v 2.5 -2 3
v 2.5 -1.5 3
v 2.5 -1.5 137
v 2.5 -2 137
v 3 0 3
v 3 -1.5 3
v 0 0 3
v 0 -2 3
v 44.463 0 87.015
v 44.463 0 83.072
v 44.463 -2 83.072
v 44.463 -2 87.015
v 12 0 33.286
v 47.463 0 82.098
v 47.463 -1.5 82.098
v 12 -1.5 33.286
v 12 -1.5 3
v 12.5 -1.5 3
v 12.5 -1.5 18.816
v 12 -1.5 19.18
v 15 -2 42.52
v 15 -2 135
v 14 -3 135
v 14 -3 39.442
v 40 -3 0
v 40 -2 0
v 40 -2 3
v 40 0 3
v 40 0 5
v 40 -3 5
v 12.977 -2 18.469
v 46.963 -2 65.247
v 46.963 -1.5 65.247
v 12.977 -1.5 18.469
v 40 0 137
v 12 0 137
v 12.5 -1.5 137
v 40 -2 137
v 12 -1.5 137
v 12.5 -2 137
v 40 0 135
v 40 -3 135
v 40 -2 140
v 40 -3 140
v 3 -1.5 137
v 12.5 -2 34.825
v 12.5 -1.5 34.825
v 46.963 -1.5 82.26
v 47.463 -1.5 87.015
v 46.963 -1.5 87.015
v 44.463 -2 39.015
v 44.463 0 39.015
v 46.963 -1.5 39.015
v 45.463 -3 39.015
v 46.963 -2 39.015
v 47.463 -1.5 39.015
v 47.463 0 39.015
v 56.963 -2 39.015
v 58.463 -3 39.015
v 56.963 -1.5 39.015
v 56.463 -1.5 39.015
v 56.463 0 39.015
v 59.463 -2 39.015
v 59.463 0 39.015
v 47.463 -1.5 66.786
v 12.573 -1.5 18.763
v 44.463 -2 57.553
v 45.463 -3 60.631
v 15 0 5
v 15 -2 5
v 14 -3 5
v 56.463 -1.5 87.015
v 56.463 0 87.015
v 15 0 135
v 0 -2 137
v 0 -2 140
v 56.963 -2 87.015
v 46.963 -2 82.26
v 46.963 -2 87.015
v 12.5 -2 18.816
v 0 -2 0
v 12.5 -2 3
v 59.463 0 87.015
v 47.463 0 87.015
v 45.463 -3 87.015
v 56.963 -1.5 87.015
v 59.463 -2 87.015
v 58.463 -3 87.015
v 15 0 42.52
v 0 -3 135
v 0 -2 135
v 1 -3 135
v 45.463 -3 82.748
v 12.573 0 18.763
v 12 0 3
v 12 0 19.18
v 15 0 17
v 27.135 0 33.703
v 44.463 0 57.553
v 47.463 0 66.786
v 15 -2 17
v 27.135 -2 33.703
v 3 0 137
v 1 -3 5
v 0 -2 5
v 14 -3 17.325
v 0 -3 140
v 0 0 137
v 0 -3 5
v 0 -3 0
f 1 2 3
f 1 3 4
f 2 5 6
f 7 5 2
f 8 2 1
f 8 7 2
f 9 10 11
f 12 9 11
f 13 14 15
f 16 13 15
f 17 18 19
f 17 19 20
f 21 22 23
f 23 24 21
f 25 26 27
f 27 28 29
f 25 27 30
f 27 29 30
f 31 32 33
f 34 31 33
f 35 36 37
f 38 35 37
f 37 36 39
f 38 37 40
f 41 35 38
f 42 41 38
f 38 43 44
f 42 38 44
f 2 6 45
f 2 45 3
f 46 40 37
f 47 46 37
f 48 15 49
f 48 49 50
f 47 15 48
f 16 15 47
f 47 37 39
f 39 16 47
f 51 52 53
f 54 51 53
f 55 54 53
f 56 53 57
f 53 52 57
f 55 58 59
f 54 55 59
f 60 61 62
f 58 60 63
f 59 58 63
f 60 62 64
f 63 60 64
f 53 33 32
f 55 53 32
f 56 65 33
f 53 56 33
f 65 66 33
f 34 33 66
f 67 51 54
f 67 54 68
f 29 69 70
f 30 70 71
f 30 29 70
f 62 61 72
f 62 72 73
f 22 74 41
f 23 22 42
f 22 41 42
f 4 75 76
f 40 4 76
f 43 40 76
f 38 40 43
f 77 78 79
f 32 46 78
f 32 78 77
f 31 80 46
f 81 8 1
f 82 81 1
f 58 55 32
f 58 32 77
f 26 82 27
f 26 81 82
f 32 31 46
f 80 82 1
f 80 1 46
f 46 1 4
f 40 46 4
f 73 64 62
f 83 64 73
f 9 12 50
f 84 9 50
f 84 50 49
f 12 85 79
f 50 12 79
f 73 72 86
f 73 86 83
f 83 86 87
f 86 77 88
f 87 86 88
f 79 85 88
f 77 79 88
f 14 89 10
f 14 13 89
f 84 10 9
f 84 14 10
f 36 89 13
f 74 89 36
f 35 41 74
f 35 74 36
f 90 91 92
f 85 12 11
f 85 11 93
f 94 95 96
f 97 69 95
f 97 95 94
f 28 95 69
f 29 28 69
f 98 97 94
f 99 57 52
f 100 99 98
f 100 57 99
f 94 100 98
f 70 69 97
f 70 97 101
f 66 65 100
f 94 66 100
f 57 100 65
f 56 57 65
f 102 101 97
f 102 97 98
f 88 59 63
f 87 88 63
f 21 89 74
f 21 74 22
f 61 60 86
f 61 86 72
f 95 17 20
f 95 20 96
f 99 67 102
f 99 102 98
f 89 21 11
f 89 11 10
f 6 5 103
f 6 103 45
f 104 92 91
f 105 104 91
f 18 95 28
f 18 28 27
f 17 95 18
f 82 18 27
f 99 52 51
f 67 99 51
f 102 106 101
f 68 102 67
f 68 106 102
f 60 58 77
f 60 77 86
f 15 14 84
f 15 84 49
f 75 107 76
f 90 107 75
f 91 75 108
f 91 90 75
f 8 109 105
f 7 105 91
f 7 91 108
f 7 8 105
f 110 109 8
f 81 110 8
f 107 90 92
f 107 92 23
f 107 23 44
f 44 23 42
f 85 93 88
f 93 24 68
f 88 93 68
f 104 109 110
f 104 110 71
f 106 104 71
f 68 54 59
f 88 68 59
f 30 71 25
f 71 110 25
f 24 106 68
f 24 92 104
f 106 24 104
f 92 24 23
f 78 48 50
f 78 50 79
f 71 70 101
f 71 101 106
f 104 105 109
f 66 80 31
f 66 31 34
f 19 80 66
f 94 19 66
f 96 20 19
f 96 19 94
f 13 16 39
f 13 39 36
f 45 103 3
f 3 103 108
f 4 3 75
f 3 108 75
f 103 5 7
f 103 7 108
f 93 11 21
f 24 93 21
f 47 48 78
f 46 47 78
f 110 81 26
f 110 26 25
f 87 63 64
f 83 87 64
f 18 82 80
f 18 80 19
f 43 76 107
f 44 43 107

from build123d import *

# Parameters (mm, degrees)
PAD_DEPTH       = 140
PAD001_DEPTH    = 2
SKETCH002_W     = 15
SKETCH002_H     = 2
PAD002_DEPTH    = 55
PAD003_DEPTH    = 2
PAD004_DEPTH    = 48
SKETCH006_W     = 3
SKETCH006_H     = 5
PAD005_DEPTH    = 40
SKETCH007_W     = 2
SKETCH007_H     = 3
POCKET_DEPTH    = 40
SKETCH008_W     = 3
SKETCH008_H     = 5
PAD006_DEPTH    = 40
SKETCH009_W     = 2
SKETCH009_H     = 3
POCKET001_DEPTH = 40
PAD007_DEPTH    = 73.5
POCKET002_DEPTH = 134
POCKET003_DEPTH = 48
POCKET004_DEPTH = 72


with BuildPart() as part:
    # Sketch001 → Pad (new body)
    with BuildSketch(Plane.XY):
        Polygon((1, -3), (0, -2), (0, 0), (15, 0), (15, -2), (14, -3), align=None)
    extrude(amount=PAD_DEPTH)

    # Sketch (on Face3 of Pad) → Pad001 (join)
    with BuildSketch(Plane(origin=(0, -2, 0), x_dir=(-1, 0, 0), z_dir=(0, 1, 0))):
        Polygon((-15, 42.5195242506), (-15, 17), (-27.1352549156, 33.7027454662), align=None)
    extrude(amount=PAD001_DEPTH)

    # Sketch002 (on Face13 of Pad001) → Pad002 (join)
    with BuildSketch(Plane(origin=(25.4016078463, 0, 34.9623137906), x_dir=(0.8090169944, 0, -0.5877852523), z_dir=(0.5877852523, 0, 0.8090169944))):
        with Locations((-5.3570943733, -1)):
            Rectangle(SKETCH002_W, SKETCH002_H)
    extrude(amount=PAD002_DEPTH)

    # Sketch003 (on Face15 of Pad002) → Pad003 (join)
    with BuildSketch(Plane(origin=(0, -2, 2), x_dir=(-1, 0, 0), z_dir=(0, 1, 0))):
        Polygon((-44.4634437917, 85.0154589412), (-59.4634437917, 85.0154589412), (-59.4634437917, 76.1986801568), align=None)
    extrude(amount=PAD003_DEPTH)

    # Sketch004 (on Face26 of Pad003) → Pad004 (join)
    with BuildSketch(Plane.XY.offset(39.0154589412)):
        Polygon((59.4634437917, 0), (44.4634437917, 0), (44.4634437917, -2), (45.4634437917, -3), (58.4634437917, -3), (59.4634437917, -2), align=None)
    extrude(amount=PAD004_DEPTH)

    # Sketch006 (on Face3 of Pad004) → Pad005 (join)
    with BuildSketch(Plane(origin=(40, 0, 0), x_dir=(0, -1, 0), z_dir=(-1, 0, 0))):
        with Locations((1.5, 2.5)):
            Rectangle(SKETCH006_W, SKETCH006_H)
    extrude(amount=PAD005_DEPTH)

    # Sketch007 (on Face3 of Pad005) → Pocket (cut)
    with BuildSketch(Plane(origin=(0, 0, 0), x_dir=(0, -1, 0), z_dir=(-1, 0, 0))):
        with Locations((1, 1.5)):
            Rectangle(SKETCH007_W, SKETCH007_H)
    extrude(amount=-POCKET_DEPTH, mode=Mode.SUBTRACT)

    # Sketch008 (on Face20 of Pocket) → Pad006 (join)
    with BuildSketch(Plane(origin=(40, 0, 0), x_dir=(0, -1, 0), z_dir=(-1, 0, 0))):
        with Locations((1.5, 137.5)):
            Rectangle(SKETCH008_W, SKETCH008_H)
    extrude(amount=PAD006_DEPTH)

    # Sketch009 (on Face30 of Pad006) → Pocket001 (cut)
    with BuildSketch(Plane(origin=(0, 0, 0), x_dir=(0, -1, 0), z_dir=(-1, 0, 0))):
        with Locations((1, 138.5)):
            Rectangle(SKETCH009_W, SKETCH009_H)
    extrude(amount=-POCKET001_DEPTH, mode=Mode.SUBTRACT)

    # Sketch005 (on DatumPlane) → Pad007 (join)
    with BuildSketch(Plane(origin=(57.9083234174, -2, 76.0582405894), x_dir=(0, -1, 0), z_dir=(-0.5877852523, 0, -0.8090169944))):
        Polygon((0, 0), (0, 15), (1, 14), (1, 1), align=None)
    extrude(amount=PAD007_DEPTH)

    # Sketch010 (on Face8 of Pad007) → Pocket002 (cut)
    with BuildSketch(Plane(origin=(0, 0, 3), x_dir=(1, 0, 0), z_dir=(0, 0, -1))):
        Polygon((3, 0), (3, 1.5), (2.5, 1.5), (2.5, 2), (12.5, 2), (12.5, 1.5), (12, 1.5), (12, 0), align=None)
    extrude(amount=-POCKET002_DEPTH, mode=Mode.SUBTRACT)

    # Sketch011 (on Face66 of Pocket002) → Pocket003 (cut)
    with BuildSketch(Plane(origin=(0, 0, 39.0154589412), x_dir=(1, 0, 0), z_dir=(0, 0, -1))):
        Polygon((46.9634437917, 2), (56.9634437917, 2), (56.9634437917, 1.5), (56.4634437917, 1.5), (56.4634437917, 0), (47.4634437917, 0), (47.4634437917, 1.5), (46.9634437917, 1.5), align=None)
    extrude(amount=-POCKET003_DEPTH, mode=Mode.SUBTRACT)

    # Sketch012 (on DatumPlane) → Pocket004 (cut)
    with BuildSketch(Plane(origin=(15, -2, 17), x_dir=(0, -1, 0), z_dir=(-0.5877852523, 0, -0.8090169944))):
        Polygon((0, 2.5), (-0.5, 2.5), (-0.5, 3), (-2, 3), (-2, 12), (-0.5, 12), (-0.5, 12.5), (0, 12.5), align=None)
    extrude(amount=-POCKET004_DEPTH, mode=Mode.SUBTRACT)


solid = part.part
